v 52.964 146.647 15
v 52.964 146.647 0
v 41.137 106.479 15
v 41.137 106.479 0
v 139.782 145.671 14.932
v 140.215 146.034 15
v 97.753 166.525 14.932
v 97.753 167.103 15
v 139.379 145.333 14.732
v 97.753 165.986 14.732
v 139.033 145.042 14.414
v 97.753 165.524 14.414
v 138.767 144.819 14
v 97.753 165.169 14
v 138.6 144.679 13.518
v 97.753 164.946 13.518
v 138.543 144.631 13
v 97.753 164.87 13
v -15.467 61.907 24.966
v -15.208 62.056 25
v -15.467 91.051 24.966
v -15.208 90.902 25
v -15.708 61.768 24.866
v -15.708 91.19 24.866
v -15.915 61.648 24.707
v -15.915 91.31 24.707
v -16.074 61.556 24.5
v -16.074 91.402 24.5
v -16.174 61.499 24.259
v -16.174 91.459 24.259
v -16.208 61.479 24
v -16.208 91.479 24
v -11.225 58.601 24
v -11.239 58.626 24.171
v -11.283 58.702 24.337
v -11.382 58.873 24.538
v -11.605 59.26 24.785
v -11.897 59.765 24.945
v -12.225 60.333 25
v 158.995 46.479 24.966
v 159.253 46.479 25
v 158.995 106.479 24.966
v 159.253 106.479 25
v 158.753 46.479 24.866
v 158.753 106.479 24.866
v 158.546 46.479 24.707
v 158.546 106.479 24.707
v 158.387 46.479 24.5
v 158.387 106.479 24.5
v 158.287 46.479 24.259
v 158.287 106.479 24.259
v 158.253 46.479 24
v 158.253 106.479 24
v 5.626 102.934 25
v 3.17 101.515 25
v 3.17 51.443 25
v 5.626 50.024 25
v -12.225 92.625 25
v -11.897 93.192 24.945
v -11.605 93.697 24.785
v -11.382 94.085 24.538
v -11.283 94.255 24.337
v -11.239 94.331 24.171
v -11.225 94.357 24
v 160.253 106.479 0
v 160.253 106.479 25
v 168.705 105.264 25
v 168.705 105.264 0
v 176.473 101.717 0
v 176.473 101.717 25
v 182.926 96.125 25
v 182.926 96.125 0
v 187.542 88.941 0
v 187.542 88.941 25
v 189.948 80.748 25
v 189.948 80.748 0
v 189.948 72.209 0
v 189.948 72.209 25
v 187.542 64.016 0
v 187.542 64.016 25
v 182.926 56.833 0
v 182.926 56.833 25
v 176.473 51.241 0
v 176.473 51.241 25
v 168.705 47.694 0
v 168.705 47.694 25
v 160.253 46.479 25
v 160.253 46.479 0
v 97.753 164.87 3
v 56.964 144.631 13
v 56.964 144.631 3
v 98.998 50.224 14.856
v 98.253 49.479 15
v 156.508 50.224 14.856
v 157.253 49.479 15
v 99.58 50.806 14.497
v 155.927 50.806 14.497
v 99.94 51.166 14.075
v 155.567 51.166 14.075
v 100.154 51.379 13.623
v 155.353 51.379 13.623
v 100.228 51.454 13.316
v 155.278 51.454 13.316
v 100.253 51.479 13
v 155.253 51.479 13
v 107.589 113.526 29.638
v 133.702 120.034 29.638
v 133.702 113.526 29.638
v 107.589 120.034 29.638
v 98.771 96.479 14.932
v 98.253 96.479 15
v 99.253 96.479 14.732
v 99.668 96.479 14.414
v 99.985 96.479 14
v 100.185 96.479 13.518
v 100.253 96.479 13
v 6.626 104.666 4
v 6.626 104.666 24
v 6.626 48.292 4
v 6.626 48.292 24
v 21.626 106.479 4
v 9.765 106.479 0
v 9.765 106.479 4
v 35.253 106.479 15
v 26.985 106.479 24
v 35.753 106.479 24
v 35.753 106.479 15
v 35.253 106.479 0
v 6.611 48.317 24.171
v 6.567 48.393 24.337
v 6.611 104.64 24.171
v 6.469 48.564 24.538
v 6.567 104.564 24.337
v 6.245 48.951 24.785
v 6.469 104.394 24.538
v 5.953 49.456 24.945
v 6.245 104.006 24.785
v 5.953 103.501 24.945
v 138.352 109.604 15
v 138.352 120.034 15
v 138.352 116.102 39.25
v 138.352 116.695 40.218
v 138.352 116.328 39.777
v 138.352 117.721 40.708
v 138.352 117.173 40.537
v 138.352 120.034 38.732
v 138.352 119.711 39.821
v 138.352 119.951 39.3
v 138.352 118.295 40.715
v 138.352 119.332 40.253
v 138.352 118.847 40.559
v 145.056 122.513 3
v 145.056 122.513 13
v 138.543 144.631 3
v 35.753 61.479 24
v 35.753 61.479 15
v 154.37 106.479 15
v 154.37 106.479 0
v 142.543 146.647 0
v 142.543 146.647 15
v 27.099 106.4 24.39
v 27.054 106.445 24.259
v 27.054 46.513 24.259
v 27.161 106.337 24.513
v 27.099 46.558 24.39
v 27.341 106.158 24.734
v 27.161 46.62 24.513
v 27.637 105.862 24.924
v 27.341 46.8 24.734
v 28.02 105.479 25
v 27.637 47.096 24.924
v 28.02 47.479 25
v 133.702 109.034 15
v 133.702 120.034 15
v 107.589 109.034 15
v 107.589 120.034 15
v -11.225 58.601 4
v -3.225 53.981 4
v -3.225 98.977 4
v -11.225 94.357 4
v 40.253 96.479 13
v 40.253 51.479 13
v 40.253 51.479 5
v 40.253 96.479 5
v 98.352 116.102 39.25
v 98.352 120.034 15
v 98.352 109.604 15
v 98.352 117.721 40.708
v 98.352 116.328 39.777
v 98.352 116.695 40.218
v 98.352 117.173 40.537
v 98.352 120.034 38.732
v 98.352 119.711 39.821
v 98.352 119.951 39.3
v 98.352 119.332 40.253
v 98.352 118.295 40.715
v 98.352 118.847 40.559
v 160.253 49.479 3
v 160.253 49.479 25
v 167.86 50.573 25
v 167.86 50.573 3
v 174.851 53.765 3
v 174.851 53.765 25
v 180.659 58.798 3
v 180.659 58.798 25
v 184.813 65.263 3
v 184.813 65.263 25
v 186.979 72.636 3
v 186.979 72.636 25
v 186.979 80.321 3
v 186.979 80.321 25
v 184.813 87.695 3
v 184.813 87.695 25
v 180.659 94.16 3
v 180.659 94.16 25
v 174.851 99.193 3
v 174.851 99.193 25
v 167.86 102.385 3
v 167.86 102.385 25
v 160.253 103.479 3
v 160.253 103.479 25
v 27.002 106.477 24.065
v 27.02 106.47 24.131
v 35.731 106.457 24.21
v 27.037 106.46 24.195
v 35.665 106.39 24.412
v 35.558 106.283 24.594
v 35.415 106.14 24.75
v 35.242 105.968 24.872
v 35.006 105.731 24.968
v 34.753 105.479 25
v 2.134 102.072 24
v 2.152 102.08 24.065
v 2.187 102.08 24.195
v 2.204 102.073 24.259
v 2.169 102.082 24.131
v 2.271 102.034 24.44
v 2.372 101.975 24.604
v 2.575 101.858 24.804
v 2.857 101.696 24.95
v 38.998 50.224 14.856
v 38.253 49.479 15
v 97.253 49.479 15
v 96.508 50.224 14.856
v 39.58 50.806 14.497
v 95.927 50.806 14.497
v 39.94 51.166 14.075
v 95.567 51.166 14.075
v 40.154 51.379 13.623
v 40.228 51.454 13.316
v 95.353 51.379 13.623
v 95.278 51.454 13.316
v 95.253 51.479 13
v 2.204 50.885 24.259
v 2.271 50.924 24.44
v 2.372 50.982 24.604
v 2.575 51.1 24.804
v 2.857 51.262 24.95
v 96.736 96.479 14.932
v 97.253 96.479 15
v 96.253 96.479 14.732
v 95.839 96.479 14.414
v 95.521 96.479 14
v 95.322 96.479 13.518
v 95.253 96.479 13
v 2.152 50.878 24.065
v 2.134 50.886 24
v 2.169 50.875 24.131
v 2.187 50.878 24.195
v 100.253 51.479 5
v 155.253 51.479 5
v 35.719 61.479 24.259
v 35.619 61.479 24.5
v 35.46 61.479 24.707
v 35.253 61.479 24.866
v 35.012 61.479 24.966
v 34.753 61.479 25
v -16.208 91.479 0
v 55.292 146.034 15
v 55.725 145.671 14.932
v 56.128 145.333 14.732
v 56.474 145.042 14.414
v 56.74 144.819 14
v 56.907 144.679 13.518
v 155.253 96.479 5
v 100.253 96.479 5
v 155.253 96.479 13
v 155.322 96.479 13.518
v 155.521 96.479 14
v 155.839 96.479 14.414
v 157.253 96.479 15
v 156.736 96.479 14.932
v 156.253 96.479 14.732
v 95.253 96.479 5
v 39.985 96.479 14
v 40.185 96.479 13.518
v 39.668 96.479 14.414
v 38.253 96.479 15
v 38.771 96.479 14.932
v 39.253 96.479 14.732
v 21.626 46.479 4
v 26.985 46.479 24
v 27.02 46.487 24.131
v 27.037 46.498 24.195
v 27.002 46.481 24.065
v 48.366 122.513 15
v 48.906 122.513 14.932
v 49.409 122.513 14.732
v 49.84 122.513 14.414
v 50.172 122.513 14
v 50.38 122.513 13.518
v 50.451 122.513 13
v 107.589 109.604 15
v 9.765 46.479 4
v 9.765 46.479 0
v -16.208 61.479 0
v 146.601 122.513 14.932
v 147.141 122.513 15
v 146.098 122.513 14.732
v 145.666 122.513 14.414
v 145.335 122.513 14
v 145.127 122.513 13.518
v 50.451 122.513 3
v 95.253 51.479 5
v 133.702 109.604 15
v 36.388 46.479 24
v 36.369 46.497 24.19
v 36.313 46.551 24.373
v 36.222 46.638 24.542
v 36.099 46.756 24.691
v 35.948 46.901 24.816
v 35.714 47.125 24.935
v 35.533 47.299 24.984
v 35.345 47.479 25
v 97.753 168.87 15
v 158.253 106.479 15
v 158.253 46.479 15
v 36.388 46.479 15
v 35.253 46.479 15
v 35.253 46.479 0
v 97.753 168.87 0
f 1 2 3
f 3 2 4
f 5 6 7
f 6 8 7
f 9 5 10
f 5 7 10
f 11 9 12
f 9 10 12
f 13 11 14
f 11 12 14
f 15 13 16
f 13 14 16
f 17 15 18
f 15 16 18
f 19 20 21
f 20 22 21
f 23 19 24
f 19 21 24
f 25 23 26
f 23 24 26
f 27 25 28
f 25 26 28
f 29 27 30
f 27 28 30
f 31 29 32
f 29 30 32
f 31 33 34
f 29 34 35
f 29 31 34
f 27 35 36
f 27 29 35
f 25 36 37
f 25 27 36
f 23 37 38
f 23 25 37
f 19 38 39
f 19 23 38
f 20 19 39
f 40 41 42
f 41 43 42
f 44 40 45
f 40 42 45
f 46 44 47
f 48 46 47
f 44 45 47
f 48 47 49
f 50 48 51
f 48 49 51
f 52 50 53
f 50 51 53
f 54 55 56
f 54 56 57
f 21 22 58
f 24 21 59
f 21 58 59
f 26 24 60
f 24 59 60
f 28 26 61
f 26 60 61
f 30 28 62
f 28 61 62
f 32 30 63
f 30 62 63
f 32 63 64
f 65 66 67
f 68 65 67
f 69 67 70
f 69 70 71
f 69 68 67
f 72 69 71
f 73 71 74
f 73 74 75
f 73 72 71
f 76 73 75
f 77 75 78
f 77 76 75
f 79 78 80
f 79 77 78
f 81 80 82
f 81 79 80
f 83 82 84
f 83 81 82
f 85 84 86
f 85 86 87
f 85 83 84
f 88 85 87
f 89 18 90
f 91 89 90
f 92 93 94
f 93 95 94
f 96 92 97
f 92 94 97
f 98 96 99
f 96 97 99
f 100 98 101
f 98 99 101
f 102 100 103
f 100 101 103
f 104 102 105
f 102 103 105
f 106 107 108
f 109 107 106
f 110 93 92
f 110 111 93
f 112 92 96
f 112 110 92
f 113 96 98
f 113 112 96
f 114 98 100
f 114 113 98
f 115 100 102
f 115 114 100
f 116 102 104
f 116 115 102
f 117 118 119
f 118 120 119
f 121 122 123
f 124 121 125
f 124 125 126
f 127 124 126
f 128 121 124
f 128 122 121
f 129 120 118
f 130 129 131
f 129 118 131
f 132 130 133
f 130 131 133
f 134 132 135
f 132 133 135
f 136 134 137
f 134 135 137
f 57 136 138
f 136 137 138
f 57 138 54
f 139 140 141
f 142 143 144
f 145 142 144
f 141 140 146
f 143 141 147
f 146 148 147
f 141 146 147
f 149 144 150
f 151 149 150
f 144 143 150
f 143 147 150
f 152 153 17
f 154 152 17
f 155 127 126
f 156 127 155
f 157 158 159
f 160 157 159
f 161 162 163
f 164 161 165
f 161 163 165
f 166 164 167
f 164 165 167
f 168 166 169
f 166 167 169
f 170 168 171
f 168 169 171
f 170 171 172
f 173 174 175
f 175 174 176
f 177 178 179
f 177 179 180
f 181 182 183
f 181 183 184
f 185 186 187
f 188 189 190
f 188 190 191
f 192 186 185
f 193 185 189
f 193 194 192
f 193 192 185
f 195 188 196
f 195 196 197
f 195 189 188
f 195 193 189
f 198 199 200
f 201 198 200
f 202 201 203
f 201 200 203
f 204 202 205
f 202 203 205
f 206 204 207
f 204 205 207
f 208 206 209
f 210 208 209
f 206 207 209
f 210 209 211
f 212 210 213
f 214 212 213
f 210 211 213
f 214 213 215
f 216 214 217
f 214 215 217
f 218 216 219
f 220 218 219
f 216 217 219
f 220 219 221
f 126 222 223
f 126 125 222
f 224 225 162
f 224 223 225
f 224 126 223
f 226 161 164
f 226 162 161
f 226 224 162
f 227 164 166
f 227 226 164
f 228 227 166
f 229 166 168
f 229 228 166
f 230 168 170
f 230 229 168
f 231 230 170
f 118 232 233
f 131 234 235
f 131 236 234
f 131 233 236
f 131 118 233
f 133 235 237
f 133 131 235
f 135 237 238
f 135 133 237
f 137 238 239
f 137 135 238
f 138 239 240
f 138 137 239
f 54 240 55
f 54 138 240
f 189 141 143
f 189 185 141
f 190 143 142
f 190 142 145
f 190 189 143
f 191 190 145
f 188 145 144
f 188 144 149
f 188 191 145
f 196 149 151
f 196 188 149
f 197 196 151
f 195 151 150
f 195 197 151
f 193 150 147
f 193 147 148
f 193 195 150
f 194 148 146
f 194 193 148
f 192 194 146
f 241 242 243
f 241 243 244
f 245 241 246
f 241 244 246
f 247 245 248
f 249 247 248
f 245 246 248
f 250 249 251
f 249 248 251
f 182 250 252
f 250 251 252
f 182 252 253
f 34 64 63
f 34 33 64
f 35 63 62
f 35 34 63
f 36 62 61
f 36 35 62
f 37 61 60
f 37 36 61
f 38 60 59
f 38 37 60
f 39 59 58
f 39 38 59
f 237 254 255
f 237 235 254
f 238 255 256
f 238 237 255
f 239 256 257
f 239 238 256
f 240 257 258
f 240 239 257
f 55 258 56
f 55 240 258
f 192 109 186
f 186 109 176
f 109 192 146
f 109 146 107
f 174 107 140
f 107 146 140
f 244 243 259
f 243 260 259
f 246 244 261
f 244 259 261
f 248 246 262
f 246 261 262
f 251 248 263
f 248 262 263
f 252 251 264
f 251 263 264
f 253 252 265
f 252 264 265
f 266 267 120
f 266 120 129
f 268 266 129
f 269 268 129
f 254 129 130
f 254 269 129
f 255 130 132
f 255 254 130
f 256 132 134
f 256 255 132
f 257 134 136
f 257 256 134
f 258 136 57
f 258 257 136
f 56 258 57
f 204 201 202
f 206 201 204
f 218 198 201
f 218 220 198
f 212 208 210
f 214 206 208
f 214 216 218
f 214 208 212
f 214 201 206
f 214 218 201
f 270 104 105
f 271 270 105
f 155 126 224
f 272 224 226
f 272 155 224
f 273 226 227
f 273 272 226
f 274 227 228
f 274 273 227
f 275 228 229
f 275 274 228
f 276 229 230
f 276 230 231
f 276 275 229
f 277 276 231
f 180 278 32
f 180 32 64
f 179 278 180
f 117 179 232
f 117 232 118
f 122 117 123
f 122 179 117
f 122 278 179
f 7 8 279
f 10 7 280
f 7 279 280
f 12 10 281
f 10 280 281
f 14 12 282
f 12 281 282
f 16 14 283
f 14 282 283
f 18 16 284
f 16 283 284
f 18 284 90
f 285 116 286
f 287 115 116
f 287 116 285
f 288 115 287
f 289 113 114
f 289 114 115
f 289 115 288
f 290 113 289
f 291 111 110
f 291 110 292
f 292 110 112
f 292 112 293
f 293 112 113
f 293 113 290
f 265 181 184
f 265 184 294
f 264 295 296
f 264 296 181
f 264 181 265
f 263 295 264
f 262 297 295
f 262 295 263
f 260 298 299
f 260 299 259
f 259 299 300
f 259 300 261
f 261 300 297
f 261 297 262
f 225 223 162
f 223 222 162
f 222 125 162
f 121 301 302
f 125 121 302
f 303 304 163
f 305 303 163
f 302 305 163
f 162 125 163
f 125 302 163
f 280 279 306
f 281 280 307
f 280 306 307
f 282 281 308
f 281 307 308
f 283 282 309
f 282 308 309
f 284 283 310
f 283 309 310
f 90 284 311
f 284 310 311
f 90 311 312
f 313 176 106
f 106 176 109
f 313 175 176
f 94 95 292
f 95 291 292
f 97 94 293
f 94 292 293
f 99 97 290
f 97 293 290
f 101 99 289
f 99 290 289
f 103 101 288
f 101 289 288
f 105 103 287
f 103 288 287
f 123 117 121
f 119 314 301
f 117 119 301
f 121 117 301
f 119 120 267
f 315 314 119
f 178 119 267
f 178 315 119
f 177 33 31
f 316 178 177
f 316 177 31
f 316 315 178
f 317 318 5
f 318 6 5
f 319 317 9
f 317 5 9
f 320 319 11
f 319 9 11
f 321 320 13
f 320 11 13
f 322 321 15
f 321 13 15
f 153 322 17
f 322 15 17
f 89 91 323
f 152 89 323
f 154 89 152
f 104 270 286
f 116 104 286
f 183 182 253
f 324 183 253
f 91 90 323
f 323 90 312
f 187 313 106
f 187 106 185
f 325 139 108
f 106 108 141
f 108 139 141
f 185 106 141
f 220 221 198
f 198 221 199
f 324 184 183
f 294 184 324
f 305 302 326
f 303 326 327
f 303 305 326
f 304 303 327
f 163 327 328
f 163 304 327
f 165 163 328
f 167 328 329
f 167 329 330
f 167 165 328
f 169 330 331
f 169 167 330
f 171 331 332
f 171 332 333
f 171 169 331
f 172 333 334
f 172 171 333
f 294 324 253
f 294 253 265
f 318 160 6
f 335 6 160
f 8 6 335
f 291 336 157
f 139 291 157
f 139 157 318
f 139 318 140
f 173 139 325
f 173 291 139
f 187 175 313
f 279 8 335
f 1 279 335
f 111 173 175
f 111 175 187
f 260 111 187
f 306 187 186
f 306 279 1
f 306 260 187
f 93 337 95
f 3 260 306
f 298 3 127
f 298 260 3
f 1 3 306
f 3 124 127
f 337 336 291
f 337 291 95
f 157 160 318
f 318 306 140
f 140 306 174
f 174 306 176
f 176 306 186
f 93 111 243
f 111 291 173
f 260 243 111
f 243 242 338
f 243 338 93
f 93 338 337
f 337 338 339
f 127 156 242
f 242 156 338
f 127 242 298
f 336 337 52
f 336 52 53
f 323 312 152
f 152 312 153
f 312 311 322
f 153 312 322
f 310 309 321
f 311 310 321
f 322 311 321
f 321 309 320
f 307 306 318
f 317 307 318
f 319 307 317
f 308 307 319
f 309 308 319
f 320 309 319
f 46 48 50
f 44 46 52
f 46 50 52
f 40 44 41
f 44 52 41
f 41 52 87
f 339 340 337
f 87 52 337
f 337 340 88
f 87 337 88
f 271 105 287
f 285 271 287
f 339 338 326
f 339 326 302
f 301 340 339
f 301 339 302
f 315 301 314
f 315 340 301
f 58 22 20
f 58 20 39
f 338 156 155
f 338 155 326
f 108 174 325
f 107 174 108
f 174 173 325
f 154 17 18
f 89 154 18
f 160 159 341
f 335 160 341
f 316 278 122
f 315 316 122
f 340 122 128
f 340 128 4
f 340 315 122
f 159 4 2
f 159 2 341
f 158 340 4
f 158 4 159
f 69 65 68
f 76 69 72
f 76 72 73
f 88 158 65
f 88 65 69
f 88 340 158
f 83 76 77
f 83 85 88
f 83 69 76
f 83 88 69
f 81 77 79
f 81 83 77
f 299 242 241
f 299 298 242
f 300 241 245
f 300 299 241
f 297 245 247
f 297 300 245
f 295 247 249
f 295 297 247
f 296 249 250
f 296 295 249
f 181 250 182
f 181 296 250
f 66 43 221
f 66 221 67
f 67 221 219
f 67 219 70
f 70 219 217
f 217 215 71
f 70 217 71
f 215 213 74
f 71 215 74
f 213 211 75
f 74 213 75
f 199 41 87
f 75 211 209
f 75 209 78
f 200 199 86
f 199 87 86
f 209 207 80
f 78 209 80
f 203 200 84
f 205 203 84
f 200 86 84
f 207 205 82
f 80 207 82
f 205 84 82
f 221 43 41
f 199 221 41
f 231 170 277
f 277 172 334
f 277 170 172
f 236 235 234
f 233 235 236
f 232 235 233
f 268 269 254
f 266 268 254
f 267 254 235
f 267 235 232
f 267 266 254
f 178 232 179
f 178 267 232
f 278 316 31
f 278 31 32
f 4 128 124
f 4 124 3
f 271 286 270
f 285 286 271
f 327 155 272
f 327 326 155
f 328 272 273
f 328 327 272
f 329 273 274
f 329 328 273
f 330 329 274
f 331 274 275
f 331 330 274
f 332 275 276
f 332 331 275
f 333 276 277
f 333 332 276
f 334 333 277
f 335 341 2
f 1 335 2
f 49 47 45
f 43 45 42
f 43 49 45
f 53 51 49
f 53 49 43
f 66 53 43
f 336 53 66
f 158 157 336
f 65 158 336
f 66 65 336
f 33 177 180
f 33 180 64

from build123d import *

# Parameters (mm, degrees)
SKETCH008_W     = 125
SKETCH008_H     = 60
PAD007_DEPTH    = 15
SKETCH009_W     = 115
SKETCH009_H     = 45
POCKET001_DEPTH = 10
SKETCH010_W     = 5
SKETCH010_H     = 45
PAD008_DEPTH    = 10
PAD009_DEPTH    = 15
PAD010_DEPTH    = 25
POCKET002_DEPTH = 122.392039
POCKET003_DEPTH = 62
PAD011_DEPTH    = 25
POCKET004_DEPTH = 22
FILLET006_R     = 1
FILLET007_R     = 1
FILLET008_R     = 1
FILLET009_R     = 1
FILLET010_R     = 2
PAD012_DEPTH    = 40
SKETCH019_W     = 26.11364
SKETCH019_H     = 14.637775
POCKET005_DEPTH = 11
POCKET006_DEPTH = 12
FILLET011_R     = 2
FILLET012_R     = 2


with BuildPart() as part:
    # Sketch008 → Pad007 (new body)
    with BuildSketch(Plane.XY):
        with Locations((97.753377, 76.478924)):
            Rectangle(SKETCH008_W, SKETCH008_H)
    extrude(amount=PAD007_DEPTH)

    # Sketch009 (on Face6 of Pad007) → Pocket001 (cut)
    with BuildSketch(Plane.XY.offset(15)):
        with Locations((97.753377, 73.978924)):
            Rectangle(SKETCH009_W, SKETCH009_H)
    extrude(amount=-POCKET001_DEPTH, mode=Mode.SUBTRACT)

    # Sketch010 (on Face11 of Pocket001) → Pad008 (join)
    with BuildSketch(Plane.XY.offset(5)):
        with Locations((97.753377, 73.978924)):
            Rectangle(SKETCH010_W, SKETCH010_H)
    extrude(amount=PAD008_DEPTH)

    # Sketch011 (on Face4 of Pad008) → Pad009 (join)
    with BuildSketch(Plane(origin=(0, 0, 0), x_dir=(1, 0, 0), z_dir=(0, 0, -1))):
        Polygon((40.253377, -103.478924), (155.253377, -103.478924), (142.543141, -146.646619), (97.753377, -168.869964), (52.963613, -146.646619), align=None)
    extrude(amount=-PAD009_DEPTH)

    # Sketch012 (on Face10 of Pad009) → Pad010 (join)
    with BuildSketch(Plane(origin=(0, 0, 0), x_dir=(1, 0, 0), z_dir=(0, 0, -1))):
        Polygon((35.753377, -91.478924), (35.753377, -61.478924), (36.388107, -46.478925), (9.764659, -46.478925), (-16.208147, -61.478924), (-16.208147, -91.478924), (9.764667, -106.478923), (35.753377, -106.478923), align=None)
    extrude(amount=-PAD010_DEPTH)

    # Sketch014 (on Face12 of Pad010) → Pocket002 (cut, through all)
    with BuildSketch(Plane.XZ.offset(-46.478925)):
        Polygon((21.625628, 4), (31.014697, 39.040485), (16.014696, 39.040485), (6.625628, 34.478157), (6.625628, 4), align=None)
    extrude(amount=-POCKET002_DEPTH, mode=Mode.SUBTRACT)

    # Sketch015 (on Face8 of Pocket002) → Pocket003 (cut)
    with BuildSketch(Plane.XZ.offset(-46.478925)):
        Polygon((2.97068, 27.121502), (-3.224708, 4), (-11.224708, 4), (-11.224708, 27.121502), align=None)
    extrude(amount=-POCKET003_DEPTH, mode=Mode.SUBTRACT)

    # Sketch016 (on Face2 of Pocket003) → Pad011 (join)
    with BuildSketch(Plane(origin=(0, 0, 0), x_dir=(1, 0, 0), z_dir=(0, 0, -1))):
        with BuildLine():
            ThreePointArc((160.253377, -106.478924), (190.253377, -76.478924), (160.253377, -46.478924))
            Line((160.253377, -46.478924), (158.253377, -46.478924))
            Line((158.253377, -46.478924), (158.253377, -106.478924))
            Line((158.253377, -106.478924), (160.253377, -106.478924))
        make_face()
    extrude(amount=-PAD011_DEPTH)

    # Sketch017 (on Face34 of Pad011) → Pocket004 (cut)
    with BuildSketch(Plane.XY.offset(25)):
        with BuildLine():
            ThreePointArc((160.253377, 49.478924), (187.253377, 76.478924), (160.253377, 103.478924))
            Line((160.253377, 103.478924), (160.253377, 49.478924))
        make_face()
    extrude(amount=-POCKET004_DEPTH, mode=Mode.SUBTRACT)

    # Fillet006
    fillet006_edges = [part.edges().sort_by_distance(p)[0] for p in [
        (158.253377, 76.478924, 25),
    ]]
    fillet(fillet006_edges, radius=FILLET006_R)

    # Fillet007
    fillet007_edges = [part.edges().sort_by_distance(p)[0] for p in [
        (31.502969, 106.478923, 25),
        (27.252561, 76.478924, 25),
        (31.820334, 46.478925, 25),
        (36.070742, 53.978925, 25),
        (35.753377, 83.978924, 25),
    ]]
    fillet(fillet007_edges, radius=FILLET007_R)

    # Fillet008
    fillet008_edges = [part.edges().sort_by_distance(p)[0] for p in [
        (2.402225, 76.478922, 25),
        (4.513926, 49.511365, 25),
        (6.625628, 76.478922, 25),
        (4.513926, 103.446479, 25),
    ]]
    fillet(fillet008_edges, radius=FILLET008_R)

    # Fillet009
    fillet009_edges = [part.edges().sort_by_distance(p)[0] for p in [
        (-16.208147, 76.478924, 25),
        (-13.716428, 60.039889, 25),
        (-11.224708, 76.478924, 25),
        (-13.716428, 92.917959, 25),
    ]]
    fillet(fillet009_edges, radius=FILLET009_R)

    # Fillet010
    fillet010_edges = [part.edges().sort_by_distance(p)[0] for p in [
        (127.753377, 51.478924, 15),
        (155.253377, 73.978924, 15),
        (100.253377, 73.978924, 15),
        (95.253377, 73.978924, 15),
        (67.753377, 51.478924, 15),
        (40.253377, 73.978924, 15),
    ]]
    fillet(fillet010_edges, radius=FILLET010_R)

    # Sketch018 (on DatumPlane) → Pad012 (join)
    with BuildSketch(Plane(origin=(138.35197, 76.478924, 12.5), x_dir=(0, 0, -1), z_dir=(1, 0, 0))):
        Polygon((0, 32.455163), (-41.423717, 43.554615), (0, 43.554615), align=None)
    extrude(amount=-PAD012_DEPTH)

    # Sketch019 (on Face25 of Pad012) → Pocket005 (cut)
    with BuildSketch(Plane(origin=(0, 120.033539, 0), x_dir=(-1, 0, 0), z_dir=(0, 1, 0))):
        with Locations((-120.645542, 22.318887)):
            Rectangle(SKETCH019_W, SKETCH019_H)
    extrude(amount=-POCKET005_DEPTH, mode=Mode.SUBTRACT)

    # Sketch020 (on Face47 of Pocket005) → Pocket006 (cut)
    with BuildSketch(Plane.XY.offset(15)):
        Polygon((50.450993, 122.512529), (145.055761, 122.512529), (138.543141, 144.6313), (97.753377, 164.869964), (56.963613, 144.6313), align=None)
    extrude(amount=-POCKET006_DEPTH, mode=Mode.SUBTRACT)

    # Fillet011
    fillet011_edges = [part.edges().sort_by_distance(p)[0] for p in [
        (53.707303, 133.571915, 15),
        (77.358495, 154.750632, 15),
        (118.148259, 154.750632, 15),
        (141.799451, 133.571915, 15),
    ]]
    fillet(fillet011_edges, radius=FILLET011_R)

    # Fillet012
    fillet012_edges = [part.edges().sort_by_distance(p)[0] for p in [
        (118.35197, 120.033539, 53.923717),
    ]]
    fillet(fillet012_edges, radius=FILLET012_R)


solid = part.part
